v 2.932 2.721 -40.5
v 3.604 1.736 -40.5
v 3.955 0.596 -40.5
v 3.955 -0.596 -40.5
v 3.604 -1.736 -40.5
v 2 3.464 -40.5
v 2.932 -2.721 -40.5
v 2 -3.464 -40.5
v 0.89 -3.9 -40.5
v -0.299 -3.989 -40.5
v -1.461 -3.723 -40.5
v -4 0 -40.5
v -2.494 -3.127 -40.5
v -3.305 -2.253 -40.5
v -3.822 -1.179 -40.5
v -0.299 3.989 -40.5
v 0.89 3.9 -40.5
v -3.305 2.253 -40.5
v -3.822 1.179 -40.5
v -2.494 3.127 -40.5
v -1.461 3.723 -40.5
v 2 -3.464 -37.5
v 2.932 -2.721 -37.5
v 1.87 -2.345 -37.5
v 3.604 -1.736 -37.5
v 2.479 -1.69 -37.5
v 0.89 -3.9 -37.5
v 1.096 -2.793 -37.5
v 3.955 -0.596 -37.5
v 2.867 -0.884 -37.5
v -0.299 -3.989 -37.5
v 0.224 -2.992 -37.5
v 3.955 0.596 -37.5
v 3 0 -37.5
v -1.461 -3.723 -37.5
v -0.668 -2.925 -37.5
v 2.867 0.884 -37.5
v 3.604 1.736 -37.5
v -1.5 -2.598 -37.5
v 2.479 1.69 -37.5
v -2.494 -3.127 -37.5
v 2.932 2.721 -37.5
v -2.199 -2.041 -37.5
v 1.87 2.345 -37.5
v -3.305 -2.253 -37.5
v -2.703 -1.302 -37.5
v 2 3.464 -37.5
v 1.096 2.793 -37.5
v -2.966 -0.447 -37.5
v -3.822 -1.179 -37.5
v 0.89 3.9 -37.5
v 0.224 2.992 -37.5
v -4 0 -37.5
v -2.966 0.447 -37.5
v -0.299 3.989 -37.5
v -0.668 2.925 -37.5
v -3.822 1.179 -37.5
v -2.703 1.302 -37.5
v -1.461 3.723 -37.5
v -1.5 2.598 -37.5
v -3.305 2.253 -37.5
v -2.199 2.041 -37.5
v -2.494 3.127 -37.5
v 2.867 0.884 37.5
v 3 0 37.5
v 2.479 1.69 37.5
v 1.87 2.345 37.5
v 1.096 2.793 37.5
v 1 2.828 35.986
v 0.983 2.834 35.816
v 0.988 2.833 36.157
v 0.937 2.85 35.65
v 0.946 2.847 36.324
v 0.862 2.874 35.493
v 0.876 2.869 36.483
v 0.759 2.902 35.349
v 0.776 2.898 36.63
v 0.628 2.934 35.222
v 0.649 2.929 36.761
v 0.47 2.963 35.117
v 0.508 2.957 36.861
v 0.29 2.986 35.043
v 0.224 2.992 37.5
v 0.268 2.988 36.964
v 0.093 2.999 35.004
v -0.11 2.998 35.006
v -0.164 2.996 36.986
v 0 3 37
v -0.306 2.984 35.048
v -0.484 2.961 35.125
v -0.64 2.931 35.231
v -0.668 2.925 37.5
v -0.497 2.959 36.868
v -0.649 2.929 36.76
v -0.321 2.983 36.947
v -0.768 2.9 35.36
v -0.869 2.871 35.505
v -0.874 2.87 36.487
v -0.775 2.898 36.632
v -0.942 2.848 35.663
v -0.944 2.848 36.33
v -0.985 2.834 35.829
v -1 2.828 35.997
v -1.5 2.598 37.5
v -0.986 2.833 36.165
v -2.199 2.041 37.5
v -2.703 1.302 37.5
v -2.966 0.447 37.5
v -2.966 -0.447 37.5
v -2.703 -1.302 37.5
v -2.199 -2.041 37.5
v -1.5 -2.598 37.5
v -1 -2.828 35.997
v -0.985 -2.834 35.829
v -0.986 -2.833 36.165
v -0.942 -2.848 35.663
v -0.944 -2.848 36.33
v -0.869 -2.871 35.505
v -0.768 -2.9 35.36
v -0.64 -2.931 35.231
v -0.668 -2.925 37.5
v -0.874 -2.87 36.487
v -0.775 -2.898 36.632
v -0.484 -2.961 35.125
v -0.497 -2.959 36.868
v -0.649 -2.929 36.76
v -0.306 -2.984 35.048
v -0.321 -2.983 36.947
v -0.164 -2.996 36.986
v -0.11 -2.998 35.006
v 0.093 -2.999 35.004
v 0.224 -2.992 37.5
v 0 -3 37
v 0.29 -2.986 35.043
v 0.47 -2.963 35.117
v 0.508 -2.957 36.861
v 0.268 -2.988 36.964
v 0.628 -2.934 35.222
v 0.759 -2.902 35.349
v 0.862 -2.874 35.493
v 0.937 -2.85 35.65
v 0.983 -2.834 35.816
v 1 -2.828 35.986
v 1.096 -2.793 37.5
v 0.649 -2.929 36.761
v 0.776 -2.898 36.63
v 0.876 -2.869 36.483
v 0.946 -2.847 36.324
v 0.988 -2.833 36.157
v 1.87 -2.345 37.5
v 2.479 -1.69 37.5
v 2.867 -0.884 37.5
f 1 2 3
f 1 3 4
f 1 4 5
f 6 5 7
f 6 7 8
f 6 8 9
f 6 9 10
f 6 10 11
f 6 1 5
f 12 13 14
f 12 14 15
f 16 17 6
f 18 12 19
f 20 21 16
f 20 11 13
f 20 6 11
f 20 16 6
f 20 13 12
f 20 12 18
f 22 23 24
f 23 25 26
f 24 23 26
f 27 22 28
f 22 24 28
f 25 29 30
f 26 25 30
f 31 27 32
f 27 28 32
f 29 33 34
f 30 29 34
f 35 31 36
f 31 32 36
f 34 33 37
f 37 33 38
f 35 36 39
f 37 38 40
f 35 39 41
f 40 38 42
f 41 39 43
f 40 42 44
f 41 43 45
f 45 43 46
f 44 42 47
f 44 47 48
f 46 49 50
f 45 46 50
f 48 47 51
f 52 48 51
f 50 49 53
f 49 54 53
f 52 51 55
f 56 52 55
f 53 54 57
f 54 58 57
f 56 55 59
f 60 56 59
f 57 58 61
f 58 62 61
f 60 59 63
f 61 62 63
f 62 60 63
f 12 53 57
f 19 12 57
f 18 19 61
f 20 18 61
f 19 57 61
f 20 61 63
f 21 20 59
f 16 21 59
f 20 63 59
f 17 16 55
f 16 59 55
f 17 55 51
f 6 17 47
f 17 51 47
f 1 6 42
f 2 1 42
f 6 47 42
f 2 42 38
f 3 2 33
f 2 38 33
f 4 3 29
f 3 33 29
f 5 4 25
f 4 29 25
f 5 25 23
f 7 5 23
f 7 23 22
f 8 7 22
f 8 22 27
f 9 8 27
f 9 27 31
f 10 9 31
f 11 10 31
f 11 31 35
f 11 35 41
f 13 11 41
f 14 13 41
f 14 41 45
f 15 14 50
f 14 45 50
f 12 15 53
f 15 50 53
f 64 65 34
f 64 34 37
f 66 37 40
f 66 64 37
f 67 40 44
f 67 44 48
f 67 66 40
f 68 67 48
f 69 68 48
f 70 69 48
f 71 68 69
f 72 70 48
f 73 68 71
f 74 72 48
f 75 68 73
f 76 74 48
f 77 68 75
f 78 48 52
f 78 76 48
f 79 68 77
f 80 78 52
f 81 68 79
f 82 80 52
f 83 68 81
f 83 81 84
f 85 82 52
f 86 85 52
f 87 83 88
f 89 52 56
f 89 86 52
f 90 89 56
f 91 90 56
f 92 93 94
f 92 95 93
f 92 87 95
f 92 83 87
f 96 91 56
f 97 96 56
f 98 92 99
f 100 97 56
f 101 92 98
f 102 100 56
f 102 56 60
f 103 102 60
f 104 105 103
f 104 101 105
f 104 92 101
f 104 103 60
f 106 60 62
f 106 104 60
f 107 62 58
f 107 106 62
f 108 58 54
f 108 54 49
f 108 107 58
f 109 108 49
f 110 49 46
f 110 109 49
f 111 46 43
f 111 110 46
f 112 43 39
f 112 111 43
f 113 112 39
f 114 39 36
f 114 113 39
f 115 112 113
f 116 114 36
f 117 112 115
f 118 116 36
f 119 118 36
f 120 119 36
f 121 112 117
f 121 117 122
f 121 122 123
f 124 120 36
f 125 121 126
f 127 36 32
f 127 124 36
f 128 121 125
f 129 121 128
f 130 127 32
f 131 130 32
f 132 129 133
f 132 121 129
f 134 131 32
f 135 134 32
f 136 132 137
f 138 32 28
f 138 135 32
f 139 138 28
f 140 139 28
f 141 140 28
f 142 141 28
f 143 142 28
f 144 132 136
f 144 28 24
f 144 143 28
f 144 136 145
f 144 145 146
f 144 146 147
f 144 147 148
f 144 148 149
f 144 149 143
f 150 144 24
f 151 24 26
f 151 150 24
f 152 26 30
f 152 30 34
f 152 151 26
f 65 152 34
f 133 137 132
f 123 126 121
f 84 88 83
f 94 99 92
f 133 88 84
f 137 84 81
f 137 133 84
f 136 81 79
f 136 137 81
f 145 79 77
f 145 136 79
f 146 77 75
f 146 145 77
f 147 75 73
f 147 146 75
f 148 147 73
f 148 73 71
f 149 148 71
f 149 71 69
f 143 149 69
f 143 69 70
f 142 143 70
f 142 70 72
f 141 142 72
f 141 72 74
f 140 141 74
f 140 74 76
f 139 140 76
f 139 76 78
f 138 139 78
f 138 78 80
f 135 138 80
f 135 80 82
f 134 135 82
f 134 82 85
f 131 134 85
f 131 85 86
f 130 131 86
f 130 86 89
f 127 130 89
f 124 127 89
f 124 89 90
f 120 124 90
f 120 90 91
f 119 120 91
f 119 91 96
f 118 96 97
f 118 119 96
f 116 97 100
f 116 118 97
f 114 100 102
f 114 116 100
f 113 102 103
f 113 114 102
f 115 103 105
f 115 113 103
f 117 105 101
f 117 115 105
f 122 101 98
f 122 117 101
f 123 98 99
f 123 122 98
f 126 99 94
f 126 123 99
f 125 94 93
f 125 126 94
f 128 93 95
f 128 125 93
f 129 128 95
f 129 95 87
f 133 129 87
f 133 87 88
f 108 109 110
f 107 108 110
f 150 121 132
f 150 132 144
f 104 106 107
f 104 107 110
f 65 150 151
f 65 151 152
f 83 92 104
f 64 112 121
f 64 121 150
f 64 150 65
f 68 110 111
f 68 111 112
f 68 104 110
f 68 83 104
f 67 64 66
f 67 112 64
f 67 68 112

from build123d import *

# Parameters (mm, degrees)
SKETCH1_R               = 3
BOSS_EXTRUDE1_DEPTH     = 37.5
SKETCH2_R               = 4
BOSS_EXTRUDE2_DEPTH     = 3
CUT_EXTRUDE1_DEPTH      = 41.893153461
CUT_EXTRUDE1_DEPTH_BACK = 41.893153461
SKETCH3_R               = 1


with BuildPart() as part:
    # Sketch1 → Boss-Extrude1 (new, symmetric)
    with BuildSketch(Plane.XY):
        Circle(SKETCH1_R)
    extrude(amount=BOSS_EXTRUDE1_DEPTH, both=True)

    # Sketch2 → Boss-Extrude2 (add)
    with BuildSketch(Plane(origin=(0, 0, -37.5), x_dir=(-1, 0, 0), z_dir=(0, 0, -1))):
        Circle(SKETCH2_R)
    extrude(amount=BOSS_EXTRUDE2_DEPTH)

    # Sketch3 → Cut-Extrude1 (cut, two sides: drawn at the far end of the back side and taken through both)
    with BuildSketch(Plane(origin=(0, 0, 0), x_dir=(1, 0, 0), z_dir=(0, 1, 0)).offset(-CUT_EXTRUDE1_DEPTH_BACK)):
        with Locations(Location((0, -36, 0), (0, 0, 270))):
            Circle(SKETCH3_R)
    extrude(amount=CUT_EXTRUDE1_DEPTH + CUT_EXTRUDE1_DEPTH_BACK, mode=Mode.SUBTRACT)


solid = part.part
